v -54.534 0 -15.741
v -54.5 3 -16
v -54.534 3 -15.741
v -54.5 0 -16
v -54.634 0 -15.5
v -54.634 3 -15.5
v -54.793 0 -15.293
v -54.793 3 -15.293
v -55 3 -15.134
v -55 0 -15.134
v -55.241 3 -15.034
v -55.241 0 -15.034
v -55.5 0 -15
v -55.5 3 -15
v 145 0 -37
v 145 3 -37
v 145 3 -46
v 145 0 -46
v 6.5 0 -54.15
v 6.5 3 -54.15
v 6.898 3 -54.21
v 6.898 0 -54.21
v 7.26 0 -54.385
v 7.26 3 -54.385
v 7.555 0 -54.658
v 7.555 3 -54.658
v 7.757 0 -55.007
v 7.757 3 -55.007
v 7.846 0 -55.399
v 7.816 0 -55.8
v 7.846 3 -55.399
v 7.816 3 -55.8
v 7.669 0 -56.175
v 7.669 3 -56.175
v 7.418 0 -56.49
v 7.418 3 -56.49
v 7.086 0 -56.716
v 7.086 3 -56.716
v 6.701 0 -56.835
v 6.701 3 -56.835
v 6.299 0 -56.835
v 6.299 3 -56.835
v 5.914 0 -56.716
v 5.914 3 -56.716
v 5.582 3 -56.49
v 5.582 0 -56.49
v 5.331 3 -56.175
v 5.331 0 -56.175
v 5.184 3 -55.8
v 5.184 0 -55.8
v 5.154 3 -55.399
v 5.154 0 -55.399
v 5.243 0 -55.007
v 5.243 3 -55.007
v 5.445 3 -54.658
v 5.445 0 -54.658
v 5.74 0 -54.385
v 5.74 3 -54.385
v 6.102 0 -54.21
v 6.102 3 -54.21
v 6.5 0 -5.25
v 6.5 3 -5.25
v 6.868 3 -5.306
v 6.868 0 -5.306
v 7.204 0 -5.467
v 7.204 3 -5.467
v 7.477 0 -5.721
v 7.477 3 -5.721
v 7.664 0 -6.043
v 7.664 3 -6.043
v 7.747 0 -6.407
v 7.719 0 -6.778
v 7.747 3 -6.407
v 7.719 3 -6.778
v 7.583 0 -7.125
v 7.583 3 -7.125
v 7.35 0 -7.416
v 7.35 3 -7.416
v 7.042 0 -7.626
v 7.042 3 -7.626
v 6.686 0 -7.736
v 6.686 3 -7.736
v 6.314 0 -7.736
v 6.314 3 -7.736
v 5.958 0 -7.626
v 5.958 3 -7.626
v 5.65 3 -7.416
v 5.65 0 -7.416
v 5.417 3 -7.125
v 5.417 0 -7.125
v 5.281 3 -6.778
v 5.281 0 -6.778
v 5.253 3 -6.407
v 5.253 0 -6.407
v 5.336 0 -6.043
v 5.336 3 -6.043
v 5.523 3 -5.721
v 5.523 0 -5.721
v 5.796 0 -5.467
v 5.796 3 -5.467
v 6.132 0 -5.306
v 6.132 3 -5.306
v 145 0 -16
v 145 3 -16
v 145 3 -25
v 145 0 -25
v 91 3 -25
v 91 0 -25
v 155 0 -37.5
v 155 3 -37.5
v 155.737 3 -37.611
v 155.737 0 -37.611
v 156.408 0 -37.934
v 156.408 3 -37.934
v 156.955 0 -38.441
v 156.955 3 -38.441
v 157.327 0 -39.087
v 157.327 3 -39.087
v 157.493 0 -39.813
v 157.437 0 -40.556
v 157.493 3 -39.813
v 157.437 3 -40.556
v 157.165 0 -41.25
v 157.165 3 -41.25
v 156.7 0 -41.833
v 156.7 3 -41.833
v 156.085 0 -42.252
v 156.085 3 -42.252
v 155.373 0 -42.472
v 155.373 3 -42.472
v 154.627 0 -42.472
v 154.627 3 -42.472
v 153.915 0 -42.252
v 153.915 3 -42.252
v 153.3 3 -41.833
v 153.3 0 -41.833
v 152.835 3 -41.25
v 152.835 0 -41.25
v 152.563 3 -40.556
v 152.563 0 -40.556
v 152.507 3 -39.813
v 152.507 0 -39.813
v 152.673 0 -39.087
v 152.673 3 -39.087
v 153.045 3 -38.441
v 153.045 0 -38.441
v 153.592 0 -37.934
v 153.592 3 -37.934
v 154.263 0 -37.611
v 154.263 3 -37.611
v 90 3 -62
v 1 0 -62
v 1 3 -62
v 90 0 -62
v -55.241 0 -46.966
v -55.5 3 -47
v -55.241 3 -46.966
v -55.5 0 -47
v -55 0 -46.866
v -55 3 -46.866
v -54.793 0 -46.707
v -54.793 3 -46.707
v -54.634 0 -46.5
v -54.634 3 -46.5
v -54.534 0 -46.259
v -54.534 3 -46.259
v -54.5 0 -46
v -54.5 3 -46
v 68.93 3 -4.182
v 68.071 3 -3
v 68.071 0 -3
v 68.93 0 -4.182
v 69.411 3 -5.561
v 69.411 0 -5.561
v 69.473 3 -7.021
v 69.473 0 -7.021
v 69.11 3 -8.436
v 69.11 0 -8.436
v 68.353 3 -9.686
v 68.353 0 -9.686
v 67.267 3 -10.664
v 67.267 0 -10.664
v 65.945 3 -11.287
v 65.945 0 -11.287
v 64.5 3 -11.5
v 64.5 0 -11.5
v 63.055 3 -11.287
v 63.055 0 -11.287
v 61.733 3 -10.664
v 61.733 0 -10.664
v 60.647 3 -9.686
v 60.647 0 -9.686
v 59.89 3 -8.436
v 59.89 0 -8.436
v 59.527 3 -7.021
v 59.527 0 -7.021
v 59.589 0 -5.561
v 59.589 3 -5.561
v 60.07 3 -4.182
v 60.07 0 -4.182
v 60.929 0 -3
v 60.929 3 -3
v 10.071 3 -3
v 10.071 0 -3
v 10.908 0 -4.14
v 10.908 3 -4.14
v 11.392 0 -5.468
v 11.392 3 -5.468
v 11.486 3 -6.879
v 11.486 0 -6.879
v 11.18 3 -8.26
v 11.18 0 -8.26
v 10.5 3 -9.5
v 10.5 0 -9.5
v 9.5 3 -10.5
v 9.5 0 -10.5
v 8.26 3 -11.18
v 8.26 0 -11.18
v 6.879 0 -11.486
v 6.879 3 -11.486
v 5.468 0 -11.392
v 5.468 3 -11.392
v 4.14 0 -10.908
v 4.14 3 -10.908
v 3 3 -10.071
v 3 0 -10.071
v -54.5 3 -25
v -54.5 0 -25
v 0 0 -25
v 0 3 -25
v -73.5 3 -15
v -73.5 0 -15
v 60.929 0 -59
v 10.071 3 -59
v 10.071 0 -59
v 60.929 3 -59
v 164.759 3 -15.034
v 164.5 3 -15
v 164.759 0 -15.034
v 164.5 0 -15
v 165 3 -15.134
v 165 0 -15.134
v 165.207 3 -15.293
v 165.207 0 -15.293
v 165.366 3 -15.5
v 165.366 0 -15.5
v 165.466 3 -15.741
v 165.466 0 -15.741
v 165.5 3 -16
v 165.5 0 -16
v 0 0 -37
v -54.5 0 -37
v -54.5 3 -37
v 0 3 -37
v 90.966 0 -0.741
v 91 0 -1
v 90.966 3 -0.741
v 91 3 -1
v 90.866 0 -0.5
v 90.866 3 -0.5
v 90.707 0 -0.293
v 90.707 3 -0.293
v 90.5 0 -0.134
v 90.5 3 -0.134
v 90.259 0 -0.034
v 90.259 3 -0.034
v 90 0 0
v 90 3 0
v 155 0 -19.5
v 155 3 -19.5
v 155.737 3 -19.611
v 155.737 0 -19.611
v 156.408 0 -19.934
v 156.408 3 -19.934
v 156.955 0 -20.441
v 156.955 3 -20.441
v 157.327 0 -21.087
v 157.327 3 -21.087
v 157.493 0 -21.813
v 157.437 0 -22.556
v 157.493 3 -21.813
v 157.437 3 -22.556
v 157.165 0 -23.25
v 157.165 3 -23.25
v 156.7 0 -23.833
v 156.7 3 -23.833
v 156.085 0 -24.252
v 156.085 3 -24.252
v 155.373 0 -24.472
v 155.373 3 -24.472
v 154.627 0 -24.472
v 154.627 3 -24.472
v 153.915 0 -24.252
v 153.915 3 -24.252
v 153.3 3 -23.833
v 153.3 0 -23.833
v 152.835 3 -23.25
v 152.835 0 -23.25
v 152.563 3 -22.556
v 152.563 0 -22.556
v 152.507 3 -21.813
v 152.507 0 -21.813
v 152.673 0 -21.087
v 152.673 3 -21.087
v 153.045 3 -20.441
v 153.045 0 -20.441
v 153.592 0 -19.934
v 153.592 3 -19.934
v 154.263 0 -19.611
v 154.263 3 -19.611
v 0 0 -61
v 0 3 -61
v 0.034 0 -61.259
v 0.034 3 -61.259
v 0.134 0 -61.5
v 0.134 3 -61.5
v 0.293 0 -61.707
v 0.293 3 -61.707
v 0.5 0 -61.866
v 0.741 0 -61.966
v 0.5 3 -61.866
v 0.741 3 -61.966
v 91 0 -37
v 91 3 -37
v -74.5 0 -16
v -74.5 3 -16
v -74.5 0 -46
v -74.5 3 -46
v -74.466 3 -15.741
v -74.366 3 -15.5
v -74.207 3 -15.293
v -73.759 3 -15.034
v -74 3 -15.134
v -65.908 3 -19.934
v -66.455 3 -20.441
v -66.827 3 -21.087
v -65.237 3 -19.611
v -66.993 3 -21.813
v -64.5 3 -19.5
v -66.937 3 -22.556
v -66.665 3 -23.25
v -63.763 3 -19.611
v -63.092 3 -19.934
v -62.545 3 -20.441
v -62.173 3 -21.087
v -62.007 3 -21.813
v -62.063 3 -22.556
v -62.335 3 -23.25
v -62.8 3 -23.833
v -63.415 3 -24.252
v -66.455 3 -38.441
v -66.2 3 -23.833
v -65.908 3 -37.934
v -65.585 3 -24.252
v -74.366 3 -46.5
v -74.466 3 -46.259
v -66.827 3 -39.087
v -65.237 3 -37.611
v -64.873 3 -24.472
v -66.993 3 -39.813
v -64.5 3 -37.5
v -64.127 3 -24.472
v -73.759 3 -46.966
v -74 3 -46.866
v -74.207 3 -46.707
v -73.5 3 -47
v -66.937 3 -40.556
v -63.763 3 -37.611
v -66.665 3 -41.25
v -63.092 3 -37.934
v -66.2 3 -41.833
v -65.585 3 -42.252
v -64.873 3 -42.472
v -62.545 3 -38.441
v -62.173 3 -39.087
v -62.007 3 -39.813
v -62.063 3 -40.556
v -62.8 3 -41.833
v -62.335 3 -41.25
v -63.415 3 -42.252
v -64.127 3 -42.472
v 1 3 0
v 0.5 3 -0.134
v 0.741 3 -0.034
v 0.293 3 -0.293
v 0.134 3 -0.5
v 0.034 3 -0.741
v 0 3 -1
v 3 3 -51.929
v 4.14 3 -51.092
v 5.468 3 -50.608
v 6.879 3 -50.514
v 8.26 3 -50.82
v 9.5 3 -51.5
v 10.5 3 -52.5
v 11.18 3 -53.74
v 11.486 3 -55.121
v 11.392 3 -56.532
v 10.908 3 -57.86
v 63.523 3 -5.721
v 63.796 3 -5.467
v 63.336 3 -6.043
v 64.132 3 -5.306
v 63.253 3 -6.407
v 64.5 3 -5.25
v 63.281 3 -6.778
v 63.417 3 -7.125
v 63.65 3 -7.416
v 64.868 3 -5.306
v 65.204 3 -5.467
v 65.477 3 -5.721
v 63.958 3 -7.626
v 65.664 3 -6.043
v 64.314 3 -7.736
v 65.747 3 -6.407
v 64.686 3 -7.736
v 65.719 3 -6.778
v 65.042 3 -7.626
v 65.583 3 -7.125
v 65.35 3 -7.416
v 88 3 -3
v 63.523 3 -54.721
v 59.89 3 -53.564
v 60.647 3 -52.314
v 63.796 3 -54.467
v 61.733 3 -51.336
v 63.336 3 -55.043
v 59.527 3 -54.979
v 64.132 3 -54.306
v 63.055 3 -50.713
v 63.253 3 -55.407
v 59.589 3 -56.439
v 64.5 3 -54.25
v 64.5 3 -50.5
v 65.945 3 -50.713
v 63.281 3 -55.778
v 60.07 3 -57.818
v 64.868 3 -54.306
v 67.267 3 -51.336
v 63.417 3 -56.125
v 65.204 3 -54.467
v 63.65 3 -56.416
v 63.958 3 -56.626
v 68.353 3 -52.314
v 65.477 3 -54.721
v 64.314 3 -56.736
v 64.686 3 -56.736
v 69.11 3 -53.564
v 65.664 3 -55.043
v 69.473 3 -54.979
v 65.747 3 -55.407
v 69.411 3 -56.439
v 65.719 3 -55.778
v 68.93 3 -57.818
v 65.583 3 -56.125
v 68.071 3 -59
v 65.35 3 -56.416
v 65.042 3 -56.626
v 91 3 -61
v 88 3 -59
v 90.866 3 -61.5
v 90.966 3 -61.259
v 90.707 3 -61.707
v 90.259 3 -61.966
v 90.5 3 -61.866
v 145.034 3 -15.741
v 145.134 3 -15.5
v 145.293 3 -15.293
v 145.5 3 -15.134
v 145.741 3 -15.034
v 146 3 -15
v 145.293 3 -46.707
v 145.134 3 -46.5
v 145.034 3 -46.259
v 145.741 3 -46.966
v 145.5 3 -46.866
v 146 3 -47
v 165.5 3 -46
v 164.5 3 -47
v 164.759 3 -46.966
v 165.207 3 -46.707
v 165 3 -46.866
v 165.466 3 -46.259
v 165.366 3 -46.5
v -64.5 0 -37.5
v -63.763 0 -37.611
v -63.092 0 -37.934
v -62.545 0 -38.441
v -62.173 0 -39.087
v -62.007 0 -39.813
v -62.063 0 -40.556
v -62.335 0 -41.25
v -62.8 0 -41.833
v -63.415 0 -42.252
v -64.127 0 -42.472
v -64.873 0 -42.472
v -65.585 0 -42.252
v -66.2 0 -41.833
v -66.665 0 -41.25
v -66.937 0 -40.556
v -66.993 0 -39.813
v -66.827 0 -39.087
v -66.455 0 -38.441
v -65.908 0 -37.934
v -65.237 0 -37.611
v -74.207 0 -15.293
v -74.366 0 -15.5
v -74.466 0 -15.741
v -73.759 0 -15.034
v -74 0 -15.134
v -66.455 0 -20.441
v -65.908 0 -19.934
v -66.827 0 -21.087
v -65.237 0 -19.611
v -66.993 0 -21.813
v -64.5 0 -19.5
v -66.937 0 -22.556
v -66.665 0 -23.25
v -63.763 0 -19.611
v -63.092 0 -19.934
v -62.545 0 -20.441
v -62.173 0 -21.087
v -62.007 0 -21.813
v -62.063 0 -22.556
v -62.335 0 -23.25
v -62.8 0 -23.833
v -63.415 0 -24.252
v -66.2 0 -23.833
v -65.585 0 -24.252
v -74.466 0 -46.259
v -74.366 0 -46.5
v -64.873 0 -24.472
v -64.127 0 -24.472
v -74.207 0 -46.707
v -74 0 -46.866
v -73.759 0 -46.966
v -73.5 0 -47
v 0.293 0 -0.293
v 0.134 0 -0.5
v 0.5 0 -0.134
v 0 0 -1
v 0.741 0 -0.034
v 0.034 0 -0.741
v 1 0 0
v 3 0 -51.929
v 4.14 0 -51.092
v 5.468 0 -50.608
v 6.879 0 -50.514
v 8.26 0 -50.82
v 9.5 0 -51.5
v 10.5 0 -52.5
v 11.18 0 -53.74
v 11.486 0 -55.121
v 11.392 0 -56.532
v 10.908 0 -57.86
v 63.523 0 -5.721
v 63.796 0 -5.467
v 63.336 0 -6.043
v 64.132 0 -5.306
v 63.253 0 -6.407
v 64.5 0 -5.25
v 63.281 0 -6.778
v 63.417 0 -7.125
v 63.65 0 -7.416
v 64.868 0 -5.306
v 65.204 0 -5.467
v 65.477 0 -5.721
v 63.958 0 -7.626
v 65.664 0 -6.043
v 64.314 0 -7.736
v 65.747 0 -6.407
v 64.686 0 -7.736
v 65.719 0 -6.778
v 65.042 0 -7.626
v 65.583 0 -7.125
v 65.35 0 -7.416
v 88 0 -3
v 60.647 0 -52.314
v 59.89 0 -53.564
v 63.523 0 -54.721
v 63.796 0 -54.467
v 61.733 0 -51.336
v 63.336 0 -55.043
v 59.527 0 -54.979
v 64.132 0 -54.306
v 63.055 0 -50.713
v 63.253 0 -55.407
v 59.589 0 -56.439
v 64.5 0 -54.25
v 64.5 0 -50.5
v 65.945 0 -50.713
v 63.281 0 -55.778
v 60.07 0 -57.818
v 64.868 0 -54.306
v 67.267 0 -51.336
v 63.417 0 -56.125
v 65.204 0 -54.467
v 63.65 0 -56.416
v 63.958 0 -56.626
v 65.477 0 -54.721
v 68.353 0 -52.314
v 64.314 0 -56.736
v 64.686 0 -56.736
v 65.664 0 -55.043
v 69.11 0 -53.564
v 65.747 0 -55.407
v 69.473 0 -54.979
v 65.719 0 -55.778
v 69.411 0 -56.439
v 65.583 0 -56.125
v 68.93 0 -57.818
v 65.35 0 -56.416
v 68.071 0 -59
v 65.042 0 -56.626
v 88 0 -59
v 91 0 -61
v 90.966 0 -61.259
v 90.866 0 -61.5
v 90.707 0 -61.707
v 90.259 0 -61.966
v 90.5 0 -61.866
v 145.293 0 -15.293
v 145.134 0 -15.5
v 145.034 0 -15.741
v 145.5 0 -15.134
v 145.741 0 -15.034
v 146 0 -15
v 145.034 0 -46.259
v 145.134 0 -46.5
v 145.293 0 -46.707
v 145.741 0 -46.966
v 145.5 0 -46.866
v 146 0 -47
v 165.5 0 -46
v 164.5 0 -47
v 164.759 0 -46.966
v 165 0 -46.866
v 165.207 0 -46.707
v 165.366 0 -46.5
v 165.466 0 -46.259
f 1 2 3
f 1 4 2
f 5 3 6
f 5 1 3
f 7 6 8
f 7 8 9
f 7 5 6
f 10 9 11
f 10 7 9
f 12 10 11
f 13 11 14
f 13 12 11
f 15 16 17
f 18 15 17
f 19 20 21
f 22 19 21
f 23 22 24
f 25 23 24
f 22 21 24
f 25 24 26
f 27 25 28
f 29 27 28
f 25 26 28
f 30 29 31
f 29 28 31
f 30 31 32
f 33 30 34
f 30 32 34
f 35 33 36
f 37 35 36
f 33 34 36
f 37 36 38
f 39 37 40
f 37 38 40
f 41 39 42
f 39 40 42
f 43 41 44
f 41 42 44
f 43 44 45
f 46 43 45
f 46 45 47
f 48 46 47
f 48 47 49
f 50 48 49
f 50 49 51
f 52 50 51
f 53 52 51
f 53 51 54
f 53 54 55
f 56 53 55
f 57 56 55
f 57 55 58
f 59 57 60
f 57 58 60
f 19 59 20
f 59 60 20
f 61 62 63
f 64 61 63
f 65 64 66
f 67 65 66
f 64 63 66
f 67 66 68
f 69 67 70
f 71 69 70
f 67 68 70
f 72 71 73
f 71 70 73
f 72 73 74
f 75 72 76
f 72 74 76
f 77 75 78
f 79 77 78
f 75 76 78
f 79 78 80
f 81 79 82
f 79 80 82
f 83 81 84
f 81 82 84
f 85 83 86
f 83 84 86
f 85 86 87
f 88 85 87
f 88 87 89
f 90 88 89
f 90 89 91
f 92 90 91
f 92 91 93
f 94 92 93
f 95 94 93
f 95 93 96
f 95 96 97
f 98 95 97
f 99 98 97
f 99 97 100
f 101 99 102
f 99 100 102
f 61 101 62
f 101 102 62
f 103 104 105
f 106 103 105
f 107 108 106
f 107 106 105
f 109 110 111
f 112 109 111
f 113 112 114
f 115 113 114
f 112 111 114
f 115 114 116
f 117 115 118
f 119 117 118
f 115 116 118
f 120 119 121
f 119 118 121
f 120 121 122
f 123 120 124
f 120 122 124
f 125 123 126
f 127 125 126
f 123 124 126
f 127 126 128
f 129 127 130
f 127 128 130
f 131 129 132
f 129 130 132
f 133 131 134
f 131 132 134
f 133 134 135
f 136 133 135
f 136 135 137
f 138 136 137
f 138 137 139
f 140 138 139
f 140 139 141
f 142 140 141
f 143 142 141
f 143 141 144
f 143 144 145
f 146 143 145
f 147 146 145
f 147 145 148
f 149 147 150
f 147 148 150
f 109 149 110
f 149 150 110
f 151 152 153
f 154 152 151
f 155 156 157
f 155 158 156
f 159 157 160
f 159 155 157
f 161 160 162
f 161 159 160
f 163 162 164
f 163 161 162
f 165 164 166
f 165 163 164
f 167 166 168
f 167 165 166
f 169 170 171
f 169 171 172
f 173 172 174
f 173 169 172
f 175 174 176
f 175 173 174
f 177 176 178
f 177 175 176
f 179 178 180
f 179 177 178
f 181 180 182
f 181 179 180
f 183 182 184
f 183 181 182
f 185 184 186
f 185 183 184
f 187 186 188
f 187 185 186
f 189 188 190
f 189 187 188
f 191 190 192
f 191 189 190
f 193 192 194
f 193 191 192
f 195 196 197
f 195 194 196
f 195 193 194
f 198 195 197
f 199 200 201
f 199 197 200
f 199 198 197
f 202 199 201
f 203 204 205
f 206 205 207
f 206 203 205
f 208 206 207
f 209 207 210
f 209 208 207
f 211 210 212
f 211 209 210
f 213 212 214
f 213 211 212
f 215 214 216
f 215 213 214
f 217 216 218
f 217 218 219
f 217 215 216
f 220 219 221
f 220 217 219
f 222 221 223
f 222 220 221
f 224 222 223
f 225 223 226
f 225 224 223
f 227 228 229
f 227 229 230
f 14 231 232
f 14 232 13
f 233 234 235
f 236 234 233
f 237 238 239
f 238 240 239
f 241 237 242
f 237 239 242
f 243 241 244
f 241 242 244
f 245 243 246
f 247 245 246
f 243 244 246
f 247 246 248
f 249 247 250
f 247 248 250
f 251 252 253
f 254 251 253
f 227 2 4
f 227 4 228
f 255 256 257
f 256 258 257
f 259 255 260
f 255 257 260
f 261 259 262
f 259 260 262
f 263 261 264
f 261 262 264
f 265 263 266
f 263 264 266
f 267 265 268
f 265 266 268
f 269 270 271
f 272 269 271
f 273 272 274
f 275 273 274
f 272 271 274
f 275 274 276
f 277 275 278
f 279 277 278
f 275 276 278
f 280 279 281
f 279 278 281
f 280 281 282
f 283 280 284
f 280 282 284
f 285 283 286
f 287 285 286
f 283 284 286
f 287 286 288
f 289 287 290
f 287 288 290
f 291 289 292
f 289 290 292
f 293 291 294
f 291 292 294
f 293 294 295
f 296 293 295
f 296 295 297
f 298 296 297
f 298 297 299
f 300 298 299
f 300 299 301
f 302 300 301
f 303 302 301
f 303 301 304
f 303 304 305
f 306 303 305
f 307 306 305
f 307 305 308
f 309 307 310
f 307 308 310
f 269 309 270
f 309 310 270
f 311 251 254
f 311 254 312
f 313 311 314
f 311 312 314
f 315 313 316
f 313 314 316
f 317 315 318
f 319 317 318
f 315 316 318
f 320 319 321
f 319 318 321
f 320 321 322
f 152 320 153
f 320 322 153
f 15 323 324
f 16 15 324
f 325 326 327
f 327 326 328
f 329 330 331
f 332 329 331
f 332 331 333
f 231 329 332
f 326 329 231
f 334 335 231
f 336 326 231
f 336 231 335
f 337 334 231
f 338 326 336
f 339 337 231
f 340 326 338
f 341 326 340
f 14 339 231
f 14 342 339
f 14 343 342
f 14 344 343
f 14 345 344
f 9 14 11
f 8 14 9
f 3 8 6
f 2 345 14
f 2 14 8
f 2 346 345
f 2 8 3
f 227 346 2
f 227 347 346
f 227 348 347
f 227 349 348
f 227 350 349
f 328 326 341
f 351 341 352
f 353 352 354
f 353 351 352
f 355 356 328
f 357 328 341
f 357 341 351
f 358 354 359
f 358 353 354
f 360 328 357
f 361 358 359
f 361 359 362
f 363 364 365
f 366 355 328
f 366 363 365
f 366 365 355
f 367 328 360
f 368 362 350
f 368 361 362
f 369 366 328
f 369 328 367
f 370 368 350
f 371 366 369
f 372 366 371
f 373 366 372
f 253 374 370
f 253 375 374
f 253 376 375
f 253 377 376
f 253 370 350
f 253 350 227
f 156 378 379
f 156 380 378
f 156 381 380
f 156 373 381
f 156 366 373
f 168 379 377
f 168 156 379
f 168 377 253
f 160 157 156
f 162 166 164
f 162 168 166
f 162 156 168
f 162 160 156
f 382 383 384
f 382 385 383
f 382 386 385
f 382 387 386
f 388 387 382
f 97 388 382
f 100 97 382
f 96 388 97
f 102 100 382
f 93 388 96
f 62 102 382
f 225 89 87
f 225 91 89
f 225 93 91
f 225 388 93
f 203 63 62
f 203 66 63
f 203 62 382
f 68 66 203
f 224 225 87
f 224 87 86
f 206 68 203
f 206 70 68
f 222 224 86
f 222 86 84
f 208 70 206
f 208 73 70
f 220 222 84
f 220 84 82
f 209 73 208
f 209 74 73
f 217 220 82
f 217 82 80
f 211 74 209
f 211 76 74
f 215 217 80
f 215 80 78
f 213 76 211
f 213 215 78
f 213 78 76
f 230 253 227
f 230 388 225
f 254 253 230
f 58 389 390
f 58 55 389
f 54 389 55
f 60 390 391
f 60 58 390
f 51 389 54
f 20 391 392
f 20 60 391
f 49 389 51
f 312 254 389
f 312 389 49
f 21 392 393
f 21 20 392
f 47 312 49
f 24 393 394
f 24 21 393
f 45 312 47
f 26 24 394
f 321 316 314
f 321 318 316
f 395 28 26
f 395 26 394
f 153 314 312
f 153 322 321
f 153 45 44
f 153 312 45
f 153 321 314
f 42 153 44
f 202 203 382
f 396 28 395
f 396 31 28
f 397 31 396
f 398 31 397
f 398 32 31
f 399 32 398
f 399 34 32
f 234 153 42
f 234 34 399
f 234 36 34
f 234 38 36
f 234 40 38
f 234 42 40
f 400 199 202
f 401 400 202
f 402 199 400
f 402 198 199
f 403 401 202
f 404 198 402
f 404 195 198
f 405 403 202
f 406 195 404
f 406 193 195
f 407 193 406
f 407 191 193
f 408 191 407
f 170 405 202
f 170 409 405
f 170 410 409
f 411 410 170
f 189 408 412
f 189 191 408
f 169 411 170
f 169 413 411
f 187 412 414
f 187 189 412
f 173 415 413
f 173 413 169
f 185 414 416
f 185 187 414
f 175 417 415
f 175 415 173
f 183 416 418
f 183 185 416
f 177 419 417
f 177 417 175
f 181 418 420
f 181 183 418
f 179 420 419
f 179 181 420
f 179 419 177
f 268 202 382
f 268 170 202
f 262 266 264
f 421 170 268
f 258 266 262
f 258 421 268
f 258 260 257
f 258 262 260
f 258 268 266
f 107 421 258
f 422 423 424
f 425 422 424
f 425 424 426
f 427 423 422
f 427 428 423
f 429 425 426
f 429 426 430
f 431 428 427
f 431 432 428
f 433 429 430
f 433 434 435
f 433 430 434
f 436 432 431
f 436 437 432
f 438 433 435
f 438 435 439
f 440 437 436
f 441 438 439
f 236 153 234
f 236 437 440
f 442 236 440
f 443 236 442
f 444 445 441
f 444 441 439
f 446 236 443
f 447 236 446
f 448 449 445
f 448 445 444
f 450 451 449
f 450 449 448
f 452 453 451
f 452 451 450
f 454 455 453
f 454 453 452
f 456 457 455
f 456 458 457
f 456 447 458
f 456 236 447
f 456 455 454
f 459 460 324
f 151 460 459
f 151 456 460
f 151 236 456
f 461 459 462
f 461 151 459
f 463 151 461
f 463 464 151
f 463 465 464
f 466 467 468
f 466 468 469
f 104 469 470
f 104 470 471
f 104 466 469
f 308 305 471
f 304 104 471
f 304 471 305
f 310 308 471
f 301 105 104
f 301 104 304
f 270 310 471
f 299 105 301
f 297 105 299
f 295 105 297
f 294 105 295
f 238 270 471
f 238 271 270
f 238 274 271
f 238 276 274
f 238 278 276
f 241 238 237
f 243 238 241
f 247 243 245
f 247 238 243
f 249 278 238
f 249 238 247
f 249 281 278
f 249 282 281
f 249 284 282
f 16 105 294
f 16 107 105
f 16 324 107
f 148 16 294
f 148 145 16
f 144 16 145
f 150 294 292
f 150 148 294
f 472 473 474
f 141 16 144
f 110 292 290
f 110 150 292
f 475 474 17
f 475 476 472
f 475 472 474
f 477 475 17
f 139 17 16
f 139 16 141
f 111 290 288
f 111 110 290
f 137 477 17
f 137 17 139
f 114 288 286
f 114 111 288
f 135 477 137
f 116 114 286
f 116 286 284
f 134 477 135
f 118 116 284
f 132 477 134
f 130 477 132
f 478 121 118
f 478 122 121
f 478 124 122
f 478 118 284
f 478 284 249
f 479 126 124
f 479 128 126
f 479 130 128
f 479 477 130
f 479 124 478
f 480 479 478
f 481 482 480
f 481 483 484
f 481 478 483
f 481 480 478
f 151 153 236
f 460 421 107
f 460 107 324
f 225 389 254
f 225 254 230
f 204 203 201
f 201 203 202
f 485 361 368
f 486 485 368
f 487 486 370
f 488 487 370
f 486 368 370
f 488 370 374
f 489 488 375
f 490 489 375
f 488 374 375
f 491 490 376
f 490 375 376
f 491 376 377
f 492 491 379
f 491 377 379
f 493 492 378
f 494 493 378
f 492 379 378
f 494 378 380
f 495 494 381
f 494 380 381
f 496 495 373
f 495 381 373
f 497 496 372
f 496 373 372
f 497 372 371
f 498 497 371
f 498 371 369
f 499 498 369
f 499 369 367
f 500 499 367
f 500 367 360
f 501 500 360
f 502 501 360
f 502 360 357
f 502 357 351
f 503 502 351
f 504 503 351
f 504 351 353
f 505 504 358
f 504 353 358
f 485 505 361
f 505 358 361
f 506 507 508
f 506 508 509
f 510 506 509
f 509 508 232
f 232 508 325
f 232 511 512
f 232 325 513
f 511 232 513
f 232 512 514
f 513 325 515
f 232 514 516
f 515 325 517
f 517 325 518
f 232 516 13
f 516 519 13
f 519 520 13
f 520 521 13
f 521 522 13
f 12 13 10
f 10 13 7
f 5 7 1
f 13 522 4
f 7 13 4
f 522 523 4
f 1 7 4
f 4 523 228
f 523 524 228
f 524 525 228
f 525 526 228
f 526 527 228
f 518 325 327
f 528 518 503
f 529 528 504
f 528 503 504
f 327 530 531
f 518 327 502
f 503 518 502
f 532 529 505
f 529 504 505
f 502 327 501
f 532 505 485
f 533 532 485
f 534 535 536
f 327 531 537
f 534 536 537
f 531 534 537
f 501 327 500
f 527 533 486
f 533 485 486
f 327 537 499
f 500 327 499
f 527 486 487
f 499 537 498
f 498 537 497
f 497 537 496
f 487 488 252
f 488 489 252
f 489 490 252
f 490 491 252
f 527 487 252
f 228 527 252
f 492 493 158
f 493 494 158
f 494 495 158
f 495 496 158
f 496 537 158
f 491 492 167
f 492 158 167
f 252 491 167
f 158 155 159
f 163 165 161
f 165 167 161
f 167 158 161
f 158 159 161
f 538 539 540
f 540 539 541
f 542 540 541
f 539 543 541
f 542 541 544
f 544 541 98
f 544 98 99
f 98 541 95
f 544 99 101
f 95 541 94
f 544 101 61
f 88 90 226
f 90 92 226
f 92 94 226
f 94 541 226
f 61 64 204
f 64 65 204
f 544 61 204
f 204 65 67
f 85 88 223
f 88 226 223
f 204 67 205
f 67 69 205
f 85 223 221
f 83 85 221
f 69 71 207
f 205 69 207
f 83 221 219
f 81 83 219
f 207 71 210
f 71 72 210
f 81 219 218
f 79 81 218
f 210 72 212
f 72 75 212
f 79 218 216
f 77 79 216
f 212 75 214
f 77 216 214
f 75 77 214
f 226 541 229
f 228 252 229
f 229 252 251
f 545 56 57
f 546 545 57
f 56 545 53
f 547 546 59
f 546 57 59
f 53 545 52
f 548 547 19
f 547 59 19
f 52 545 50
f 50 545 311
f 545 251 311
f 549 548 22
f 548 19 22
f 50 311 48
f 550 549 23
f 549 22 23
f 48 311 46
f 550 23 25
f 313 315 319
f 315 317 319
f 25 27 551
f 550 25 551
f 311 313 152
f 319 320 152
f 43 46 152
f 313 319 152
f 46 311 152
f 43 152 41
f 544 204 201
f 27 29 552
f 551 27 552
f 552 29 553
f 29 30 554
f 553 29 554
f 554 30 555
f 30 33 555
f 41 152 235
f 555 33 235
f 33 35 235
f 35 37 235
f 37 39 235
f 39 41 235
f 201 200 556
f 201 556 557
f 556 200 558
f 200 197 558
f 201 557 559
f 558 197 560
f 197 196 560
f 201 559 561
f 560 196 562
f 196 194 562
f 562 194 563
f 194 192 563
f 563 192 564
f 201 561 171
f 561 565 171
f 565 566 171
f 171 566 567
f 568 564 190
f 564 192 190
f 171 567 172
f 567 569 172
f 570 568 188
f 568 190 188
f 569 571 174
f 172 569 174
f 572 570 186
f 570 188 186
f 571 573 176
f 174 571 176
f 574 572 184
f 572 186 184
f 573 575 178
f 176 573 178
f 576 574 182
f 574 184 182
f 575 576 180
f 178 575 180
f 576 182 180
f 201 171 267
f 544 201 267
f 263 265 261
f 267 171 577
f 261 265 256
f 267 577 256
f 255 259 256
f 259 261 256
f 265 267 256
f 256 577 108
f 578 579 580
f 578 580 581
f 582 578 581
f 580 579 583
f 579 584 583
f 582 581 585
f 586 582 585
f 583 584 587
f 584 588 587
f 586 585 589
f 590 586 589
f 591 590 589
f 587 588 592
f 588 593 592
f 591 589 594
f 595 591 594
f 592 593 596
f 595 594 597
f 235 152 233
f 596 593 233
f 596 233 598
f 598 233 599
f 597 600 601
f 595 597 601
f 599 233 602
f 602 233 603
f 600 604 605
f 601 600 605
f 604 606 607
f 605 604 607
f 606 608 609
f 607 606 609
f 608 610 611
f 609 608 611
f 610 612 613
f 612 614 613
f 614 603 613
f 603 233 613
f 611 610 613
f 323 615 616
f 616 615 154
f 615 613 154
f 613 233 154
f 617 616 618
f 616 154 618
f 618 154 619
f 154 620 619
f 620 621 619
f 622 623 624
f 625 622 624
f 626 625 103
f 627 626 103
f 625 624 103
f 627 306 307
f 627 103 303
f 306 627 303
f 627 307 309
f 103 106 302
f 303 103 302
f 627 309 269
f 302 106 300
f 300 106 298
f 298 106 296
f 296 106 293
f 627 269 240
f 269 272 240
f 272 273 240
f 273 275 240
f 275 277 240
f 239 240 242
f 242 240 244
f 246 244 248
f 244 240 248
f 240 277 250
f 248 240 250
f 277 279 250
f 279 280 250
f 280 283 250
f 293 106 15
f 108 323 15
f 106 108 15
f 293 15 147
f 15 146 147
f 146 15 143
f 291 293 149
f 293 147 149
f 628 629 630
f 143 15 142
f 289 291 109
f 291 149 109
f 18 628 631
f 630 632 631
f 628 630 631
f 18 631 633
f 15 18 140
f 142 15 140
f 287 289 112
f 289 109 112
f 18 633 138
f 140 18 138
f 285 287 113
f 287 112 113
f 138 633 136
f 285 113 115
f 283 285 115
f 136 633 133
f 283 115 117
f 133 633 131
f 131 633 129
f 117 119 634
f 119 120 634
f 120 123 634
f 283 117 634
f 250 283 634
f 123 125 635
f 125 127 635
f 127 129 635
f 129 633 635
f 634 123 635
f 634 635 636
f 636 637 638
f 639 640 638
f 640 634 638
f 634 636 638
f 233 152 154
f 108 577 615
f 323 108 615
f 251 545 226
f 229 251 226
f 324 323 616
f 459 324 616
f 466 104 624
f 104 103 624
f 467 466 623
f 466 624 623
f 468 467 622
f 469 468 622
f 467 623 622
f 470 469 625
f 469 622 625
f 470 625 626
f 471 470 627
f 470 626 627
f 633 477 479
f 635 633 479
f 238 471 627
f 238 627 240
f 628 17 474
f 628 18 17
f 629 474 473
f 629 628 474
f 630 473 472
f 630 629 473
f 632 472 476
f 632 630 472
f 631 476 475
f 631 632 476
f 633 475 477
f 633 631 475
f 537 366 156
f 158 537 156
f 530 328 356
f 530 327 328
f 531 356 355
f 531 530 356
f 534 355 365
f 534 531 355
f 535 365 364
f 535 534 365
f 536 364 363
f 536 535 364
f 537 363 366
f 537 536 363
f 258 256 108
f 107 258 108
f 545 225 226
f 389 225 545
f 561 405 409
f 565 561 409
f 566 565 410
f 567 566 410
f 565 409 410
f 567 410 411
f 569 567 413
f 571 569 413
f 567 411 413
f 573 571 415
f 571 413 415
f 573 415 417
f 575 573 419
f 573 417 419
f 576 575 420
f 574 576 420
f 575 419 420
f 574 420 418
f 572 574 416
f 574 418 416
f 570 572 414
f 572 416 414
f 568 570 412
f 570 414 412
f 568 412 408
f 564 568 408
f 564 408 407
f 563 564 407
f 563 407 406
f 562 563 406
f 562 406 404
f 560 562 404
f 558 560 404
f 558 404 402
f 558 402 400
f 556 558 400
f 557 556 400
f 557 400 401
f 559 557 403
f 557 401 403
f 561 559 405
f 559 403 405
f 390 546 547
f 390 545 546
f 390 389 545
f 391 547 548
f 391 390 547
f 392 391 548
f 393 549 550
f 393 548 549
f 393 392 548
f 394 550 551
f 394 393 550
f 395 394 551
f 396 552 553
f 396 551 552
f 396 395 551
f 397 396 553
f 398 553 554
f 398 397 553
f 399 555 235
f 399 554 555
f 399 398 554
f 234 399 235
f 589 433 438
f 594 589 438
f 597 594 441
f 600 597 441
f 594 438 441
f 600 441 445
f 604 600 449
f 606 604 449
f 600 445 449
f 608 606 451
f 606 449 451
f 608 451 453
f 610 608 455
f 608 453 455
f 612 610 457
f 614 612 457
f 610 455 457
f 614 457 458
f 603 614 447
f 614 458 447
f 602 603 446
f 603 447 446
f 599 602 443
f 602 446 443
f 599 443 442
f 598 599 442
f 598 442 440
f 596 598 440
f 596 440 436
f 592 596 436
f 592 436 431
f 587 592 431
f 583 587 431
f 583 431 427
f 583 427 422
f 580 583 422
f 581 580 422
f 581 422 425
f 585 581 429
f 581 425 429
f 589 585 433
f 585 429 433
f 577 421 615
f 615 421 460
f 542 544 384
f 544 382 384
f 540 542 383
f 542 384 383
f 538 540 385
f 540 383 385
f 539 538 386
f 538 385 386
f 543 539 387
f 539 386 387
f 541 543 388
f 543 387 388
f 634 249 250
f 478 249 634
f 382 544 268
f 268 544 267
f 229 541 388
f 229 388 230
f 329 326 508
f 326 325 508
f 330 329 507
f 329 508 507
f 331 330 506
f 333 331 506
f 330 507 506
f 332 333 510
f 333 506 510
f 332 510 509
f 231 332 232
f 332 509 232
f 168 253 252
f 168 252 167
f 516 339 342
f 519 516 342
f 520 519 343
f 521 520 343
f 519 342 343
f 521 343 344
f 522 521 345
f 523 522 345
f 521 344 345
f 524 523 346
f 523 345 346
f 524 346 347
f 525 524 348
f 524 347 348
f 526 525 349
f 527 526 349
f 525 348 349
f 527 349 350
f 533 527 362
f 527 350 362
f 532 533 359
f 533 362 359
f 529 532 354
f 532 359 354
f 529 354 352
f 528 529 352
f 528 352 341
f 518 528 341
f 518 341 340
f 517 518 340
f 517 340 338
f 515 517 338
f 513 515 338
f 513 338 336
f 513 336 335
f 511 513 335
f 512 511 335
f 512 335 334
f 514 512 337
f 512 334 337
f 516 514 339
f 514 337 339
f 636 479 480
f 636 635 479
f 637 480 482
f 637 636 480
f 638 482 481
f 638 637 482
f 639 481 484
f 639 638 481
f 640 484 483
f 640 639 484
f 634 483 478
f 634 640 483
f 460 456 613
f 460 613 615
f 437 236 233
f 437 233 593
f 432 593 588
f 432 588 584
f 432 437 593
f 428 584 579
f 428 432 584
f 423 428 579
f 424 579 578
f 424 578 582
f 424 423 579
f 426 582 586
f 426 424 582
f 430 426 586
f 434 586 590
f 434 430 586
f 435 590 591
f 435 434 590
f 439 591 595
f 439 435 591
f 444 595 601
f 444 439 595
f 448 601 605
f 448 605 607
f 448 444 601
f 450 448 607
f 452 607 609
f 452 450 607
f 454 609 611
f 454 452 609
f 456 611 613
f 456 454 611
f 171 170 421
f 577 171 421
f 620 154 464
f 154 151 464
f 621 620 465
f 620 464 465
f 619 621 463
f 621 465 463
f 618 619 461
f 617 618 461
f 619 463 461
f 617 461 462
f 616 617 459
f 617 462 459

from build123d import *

# Parameters (mm, degrees)
SKETCH1_W           = 91
SKETCH1_H           = 62
BOSS_EXTRUDE3_DEPTH = 3
SKETCH2_W           = 85
SKETCH2_H           = 56
CUT_EXTRUDE1_DEPTH  = 3
SKETCH3_R           = 5
SKETCH3_R_2         = 1.25
SKETCH3_R_3         = 1.35
BOSS_EXTRUDE4_DEPTH = 3
SKETCH4_W           = 12
SKETCH4_H           = 3
BOSS_EXTRUDE5_DEPTH = 54.5
SKETCH5_W           = 20
SKETCH5_H           = 32
SKETCH5_R           = 2.5
BOSS_EXTRUDE6_DEPTH = 3
SKETCH6_W           = 12
SKETCH6_H           = 3
BOSS_EXTRUDE7_DEPTH = 54.5
SKETCH7_R           = 5
SKETCH7_R_2         = 1.25
BOSS_EXTRUDE8_DEPTH = 3
SKETCH8_W           = 20.5
SKETCH8_H           = 32
SKETCH8_R           = 2.5
BOSS_EXTRUDE9_DEPTH = 3
FILLET1_R           = 1


with BuildPart() as part:
    # Sketch1 → Boss-Extrude3 (new body)
    with BuildSketch(Plane(origin=(0, 0, 0), x_dir=(1, 0, 0), z_dir=(0, 1, 0))):
        with Locations((45.5, 31)):
            Rectangle(SKETCH1_W, SKETCH1_H)
    extrude(amount=BOSS_EXTRUDE3_DEPTH)

    # Sketch2 → Cut-Extrude1 (cut)
    with BuildSketch(Plane(origin=(0, 3, 0), x_dir=(1, 0, 0), z_dir=(0, 1, 0))):
        with Locations((45.5, 31)):
            Rectangle(SKETCH2_W, SKETCH2_H)
    extrude(amount=-CUT_EXTRUDE1_DEPTH, mode=Mode.SUBTRACT)

    # Sketch3 → Boss-Extrude4 (add)
    # profile 1 of 2: a face of its own
    with BuildSketch(Plane(origin=(0, 3, 0), x_dir=(1, 0, 0), z_dir=(0, 1, 0))):
        with Locations((6.5, 6.5)):
            Circle(SKETCH3_R)
        with Locations(Location((6.5, 6.5, 0), (0, 0, 270))):
            Circle(SKETCH3_R_2, mode=Mode.SUBTRACT)
    # profile 2 of 2: a face of its own
    with BuildSketch(Plane(origin=(0, 3, 0), x_dir=(1, 0, 0), z_dir=(0, 1, 0))):
        with Locations((6.5, 55.5)):
            Circle(SKETCH3_R)
        with Locations(Location((6.5, 55.5, 0), (0, 0, 270))):
            Circle(SKETCH3_R_3, mode=Mode.SUBTRACT)
    extrude(amount=-BOSS_EXTRUDE4_DEPTH)

    # Sketch4 → Boss-Extrude5 (add)
    with BuildSketch(Plane.ZY):
        with Locations((-31, 1.5)):
            Rectangle(SKETCH4_W, SKETCH4_H)
    extrude(amount=BOSS_EXTRUDE5_DEPTH)

    # Sketch5 → Boss-Extrude6 (add)
    with BuildSketch(Plane(origin=(0, 3, 0), x_dir=(1, 0, 0), z_dir=(0, 1, 0))):
        with Locations((-64.5, 31)):
            Rectangle(SKETCH5_W, SKETCH5_H)
        with Locations(Location((-64.5, 40, 0), (0, 0, 270))):
            Circle(SKETCH5_R, mode=Mode.SUBTRACT)
        with Locations(Location((-64.5, 22, 0), (0, 0, 270))):
            Circle(SKETCH5_R, mode=Mode.SUBTRACT)
    extrude(amount=-BOSS_EXTRUDE6_DEPTH)

    # Sketch6 → Boss-Extrude7 (add)
    with BuildSketch(Plane(origin=(91, 0, 0), x_dir=(0, 0, -1), z_dir=(1, 0, 0))):
        with Locations((31, 1.5)):
            Rectangle(SKETCH6_W, SKETCH6_H)
    extrude(amount=BOSS_EXTRUDE7_DEPTH)

    # Sketch7 → Boss-Extrude8 (add)
    # profile 1 of 2: a face of its own
    with BuildSketch(Plane(origin=(0, 3, 0), x_dir=(1, 0, 0), z_dir=(0, 1, 0))):
        with Locations((64.5, 55.5)):
            Circle(SKETCH7_R)
        with Locations(Location((64.5, 55.5, 0), (0, 0, 270))):
            Circle(SKETCH7_R_2, mode=Mode.SUBTRACT)
    # profile 2 of 2: a face of its own
    with BuildSketch(Plane(origin=(0, 3, 0), x_dir=(1, 0, 0), z_dir=(0, 1, 0))):
        with Locations((64.5, 6.5)):
            Circle(SKETCH7_R)
        with Locations(Location((64.5, 6.5, 0), (0, 0, 270))):
            Circle(SKETCH7_R_2, mode=Mode.SUBTRACT)
    extrude(amount=-BOSS_EXTRUDE8_DEPTH)

    # Sketch8 → Boss-Extrude9 (add)
    with BuildSketch(Plane(origin=(0, 3, 0), x_dir=(1, 0, 0), z_dir=(0, 1, 0))):
        with Locations((155.25, 31)):
            Rectangle(SKETCH8_W, SKETCH8_H)
        with Locations(Location((155, 40, 0), (0, 0, 270))):
            Circle(SKETCH8_R, mode=Mode.SUBTRACT)
        with Locations(Location((155, 22, 0), (0, 0, 270))):
            Circle(SKETCH8_R, mode=Mode.SUBTRACT)
    extrude(amount=-BOSS_EXTRUDE9_DEPTH)

    # Fillet1
    fillet1_edges = [part.edges().sort_by_distance(p)[0] for p in [
        (145, 1.5, -15),
        (145, 1.5, -47),
        (165.5, 1.5, -47),
        (165.5, 1.5, -15),
        (-54.5, 1.5, -47),
        (-54.5, 1.5, -15),
        (-74.5, 1.5, -15),
        (-74.5, 1.5, -47),
        (0, 1.5, -62),
        (91, 1.5, -62),
        (91, 1.5, 0),
        (0, 1.5, 0),
    ]]
    fillet(fillet1_edges, radius=FILLET1_R)


solid = part.part
